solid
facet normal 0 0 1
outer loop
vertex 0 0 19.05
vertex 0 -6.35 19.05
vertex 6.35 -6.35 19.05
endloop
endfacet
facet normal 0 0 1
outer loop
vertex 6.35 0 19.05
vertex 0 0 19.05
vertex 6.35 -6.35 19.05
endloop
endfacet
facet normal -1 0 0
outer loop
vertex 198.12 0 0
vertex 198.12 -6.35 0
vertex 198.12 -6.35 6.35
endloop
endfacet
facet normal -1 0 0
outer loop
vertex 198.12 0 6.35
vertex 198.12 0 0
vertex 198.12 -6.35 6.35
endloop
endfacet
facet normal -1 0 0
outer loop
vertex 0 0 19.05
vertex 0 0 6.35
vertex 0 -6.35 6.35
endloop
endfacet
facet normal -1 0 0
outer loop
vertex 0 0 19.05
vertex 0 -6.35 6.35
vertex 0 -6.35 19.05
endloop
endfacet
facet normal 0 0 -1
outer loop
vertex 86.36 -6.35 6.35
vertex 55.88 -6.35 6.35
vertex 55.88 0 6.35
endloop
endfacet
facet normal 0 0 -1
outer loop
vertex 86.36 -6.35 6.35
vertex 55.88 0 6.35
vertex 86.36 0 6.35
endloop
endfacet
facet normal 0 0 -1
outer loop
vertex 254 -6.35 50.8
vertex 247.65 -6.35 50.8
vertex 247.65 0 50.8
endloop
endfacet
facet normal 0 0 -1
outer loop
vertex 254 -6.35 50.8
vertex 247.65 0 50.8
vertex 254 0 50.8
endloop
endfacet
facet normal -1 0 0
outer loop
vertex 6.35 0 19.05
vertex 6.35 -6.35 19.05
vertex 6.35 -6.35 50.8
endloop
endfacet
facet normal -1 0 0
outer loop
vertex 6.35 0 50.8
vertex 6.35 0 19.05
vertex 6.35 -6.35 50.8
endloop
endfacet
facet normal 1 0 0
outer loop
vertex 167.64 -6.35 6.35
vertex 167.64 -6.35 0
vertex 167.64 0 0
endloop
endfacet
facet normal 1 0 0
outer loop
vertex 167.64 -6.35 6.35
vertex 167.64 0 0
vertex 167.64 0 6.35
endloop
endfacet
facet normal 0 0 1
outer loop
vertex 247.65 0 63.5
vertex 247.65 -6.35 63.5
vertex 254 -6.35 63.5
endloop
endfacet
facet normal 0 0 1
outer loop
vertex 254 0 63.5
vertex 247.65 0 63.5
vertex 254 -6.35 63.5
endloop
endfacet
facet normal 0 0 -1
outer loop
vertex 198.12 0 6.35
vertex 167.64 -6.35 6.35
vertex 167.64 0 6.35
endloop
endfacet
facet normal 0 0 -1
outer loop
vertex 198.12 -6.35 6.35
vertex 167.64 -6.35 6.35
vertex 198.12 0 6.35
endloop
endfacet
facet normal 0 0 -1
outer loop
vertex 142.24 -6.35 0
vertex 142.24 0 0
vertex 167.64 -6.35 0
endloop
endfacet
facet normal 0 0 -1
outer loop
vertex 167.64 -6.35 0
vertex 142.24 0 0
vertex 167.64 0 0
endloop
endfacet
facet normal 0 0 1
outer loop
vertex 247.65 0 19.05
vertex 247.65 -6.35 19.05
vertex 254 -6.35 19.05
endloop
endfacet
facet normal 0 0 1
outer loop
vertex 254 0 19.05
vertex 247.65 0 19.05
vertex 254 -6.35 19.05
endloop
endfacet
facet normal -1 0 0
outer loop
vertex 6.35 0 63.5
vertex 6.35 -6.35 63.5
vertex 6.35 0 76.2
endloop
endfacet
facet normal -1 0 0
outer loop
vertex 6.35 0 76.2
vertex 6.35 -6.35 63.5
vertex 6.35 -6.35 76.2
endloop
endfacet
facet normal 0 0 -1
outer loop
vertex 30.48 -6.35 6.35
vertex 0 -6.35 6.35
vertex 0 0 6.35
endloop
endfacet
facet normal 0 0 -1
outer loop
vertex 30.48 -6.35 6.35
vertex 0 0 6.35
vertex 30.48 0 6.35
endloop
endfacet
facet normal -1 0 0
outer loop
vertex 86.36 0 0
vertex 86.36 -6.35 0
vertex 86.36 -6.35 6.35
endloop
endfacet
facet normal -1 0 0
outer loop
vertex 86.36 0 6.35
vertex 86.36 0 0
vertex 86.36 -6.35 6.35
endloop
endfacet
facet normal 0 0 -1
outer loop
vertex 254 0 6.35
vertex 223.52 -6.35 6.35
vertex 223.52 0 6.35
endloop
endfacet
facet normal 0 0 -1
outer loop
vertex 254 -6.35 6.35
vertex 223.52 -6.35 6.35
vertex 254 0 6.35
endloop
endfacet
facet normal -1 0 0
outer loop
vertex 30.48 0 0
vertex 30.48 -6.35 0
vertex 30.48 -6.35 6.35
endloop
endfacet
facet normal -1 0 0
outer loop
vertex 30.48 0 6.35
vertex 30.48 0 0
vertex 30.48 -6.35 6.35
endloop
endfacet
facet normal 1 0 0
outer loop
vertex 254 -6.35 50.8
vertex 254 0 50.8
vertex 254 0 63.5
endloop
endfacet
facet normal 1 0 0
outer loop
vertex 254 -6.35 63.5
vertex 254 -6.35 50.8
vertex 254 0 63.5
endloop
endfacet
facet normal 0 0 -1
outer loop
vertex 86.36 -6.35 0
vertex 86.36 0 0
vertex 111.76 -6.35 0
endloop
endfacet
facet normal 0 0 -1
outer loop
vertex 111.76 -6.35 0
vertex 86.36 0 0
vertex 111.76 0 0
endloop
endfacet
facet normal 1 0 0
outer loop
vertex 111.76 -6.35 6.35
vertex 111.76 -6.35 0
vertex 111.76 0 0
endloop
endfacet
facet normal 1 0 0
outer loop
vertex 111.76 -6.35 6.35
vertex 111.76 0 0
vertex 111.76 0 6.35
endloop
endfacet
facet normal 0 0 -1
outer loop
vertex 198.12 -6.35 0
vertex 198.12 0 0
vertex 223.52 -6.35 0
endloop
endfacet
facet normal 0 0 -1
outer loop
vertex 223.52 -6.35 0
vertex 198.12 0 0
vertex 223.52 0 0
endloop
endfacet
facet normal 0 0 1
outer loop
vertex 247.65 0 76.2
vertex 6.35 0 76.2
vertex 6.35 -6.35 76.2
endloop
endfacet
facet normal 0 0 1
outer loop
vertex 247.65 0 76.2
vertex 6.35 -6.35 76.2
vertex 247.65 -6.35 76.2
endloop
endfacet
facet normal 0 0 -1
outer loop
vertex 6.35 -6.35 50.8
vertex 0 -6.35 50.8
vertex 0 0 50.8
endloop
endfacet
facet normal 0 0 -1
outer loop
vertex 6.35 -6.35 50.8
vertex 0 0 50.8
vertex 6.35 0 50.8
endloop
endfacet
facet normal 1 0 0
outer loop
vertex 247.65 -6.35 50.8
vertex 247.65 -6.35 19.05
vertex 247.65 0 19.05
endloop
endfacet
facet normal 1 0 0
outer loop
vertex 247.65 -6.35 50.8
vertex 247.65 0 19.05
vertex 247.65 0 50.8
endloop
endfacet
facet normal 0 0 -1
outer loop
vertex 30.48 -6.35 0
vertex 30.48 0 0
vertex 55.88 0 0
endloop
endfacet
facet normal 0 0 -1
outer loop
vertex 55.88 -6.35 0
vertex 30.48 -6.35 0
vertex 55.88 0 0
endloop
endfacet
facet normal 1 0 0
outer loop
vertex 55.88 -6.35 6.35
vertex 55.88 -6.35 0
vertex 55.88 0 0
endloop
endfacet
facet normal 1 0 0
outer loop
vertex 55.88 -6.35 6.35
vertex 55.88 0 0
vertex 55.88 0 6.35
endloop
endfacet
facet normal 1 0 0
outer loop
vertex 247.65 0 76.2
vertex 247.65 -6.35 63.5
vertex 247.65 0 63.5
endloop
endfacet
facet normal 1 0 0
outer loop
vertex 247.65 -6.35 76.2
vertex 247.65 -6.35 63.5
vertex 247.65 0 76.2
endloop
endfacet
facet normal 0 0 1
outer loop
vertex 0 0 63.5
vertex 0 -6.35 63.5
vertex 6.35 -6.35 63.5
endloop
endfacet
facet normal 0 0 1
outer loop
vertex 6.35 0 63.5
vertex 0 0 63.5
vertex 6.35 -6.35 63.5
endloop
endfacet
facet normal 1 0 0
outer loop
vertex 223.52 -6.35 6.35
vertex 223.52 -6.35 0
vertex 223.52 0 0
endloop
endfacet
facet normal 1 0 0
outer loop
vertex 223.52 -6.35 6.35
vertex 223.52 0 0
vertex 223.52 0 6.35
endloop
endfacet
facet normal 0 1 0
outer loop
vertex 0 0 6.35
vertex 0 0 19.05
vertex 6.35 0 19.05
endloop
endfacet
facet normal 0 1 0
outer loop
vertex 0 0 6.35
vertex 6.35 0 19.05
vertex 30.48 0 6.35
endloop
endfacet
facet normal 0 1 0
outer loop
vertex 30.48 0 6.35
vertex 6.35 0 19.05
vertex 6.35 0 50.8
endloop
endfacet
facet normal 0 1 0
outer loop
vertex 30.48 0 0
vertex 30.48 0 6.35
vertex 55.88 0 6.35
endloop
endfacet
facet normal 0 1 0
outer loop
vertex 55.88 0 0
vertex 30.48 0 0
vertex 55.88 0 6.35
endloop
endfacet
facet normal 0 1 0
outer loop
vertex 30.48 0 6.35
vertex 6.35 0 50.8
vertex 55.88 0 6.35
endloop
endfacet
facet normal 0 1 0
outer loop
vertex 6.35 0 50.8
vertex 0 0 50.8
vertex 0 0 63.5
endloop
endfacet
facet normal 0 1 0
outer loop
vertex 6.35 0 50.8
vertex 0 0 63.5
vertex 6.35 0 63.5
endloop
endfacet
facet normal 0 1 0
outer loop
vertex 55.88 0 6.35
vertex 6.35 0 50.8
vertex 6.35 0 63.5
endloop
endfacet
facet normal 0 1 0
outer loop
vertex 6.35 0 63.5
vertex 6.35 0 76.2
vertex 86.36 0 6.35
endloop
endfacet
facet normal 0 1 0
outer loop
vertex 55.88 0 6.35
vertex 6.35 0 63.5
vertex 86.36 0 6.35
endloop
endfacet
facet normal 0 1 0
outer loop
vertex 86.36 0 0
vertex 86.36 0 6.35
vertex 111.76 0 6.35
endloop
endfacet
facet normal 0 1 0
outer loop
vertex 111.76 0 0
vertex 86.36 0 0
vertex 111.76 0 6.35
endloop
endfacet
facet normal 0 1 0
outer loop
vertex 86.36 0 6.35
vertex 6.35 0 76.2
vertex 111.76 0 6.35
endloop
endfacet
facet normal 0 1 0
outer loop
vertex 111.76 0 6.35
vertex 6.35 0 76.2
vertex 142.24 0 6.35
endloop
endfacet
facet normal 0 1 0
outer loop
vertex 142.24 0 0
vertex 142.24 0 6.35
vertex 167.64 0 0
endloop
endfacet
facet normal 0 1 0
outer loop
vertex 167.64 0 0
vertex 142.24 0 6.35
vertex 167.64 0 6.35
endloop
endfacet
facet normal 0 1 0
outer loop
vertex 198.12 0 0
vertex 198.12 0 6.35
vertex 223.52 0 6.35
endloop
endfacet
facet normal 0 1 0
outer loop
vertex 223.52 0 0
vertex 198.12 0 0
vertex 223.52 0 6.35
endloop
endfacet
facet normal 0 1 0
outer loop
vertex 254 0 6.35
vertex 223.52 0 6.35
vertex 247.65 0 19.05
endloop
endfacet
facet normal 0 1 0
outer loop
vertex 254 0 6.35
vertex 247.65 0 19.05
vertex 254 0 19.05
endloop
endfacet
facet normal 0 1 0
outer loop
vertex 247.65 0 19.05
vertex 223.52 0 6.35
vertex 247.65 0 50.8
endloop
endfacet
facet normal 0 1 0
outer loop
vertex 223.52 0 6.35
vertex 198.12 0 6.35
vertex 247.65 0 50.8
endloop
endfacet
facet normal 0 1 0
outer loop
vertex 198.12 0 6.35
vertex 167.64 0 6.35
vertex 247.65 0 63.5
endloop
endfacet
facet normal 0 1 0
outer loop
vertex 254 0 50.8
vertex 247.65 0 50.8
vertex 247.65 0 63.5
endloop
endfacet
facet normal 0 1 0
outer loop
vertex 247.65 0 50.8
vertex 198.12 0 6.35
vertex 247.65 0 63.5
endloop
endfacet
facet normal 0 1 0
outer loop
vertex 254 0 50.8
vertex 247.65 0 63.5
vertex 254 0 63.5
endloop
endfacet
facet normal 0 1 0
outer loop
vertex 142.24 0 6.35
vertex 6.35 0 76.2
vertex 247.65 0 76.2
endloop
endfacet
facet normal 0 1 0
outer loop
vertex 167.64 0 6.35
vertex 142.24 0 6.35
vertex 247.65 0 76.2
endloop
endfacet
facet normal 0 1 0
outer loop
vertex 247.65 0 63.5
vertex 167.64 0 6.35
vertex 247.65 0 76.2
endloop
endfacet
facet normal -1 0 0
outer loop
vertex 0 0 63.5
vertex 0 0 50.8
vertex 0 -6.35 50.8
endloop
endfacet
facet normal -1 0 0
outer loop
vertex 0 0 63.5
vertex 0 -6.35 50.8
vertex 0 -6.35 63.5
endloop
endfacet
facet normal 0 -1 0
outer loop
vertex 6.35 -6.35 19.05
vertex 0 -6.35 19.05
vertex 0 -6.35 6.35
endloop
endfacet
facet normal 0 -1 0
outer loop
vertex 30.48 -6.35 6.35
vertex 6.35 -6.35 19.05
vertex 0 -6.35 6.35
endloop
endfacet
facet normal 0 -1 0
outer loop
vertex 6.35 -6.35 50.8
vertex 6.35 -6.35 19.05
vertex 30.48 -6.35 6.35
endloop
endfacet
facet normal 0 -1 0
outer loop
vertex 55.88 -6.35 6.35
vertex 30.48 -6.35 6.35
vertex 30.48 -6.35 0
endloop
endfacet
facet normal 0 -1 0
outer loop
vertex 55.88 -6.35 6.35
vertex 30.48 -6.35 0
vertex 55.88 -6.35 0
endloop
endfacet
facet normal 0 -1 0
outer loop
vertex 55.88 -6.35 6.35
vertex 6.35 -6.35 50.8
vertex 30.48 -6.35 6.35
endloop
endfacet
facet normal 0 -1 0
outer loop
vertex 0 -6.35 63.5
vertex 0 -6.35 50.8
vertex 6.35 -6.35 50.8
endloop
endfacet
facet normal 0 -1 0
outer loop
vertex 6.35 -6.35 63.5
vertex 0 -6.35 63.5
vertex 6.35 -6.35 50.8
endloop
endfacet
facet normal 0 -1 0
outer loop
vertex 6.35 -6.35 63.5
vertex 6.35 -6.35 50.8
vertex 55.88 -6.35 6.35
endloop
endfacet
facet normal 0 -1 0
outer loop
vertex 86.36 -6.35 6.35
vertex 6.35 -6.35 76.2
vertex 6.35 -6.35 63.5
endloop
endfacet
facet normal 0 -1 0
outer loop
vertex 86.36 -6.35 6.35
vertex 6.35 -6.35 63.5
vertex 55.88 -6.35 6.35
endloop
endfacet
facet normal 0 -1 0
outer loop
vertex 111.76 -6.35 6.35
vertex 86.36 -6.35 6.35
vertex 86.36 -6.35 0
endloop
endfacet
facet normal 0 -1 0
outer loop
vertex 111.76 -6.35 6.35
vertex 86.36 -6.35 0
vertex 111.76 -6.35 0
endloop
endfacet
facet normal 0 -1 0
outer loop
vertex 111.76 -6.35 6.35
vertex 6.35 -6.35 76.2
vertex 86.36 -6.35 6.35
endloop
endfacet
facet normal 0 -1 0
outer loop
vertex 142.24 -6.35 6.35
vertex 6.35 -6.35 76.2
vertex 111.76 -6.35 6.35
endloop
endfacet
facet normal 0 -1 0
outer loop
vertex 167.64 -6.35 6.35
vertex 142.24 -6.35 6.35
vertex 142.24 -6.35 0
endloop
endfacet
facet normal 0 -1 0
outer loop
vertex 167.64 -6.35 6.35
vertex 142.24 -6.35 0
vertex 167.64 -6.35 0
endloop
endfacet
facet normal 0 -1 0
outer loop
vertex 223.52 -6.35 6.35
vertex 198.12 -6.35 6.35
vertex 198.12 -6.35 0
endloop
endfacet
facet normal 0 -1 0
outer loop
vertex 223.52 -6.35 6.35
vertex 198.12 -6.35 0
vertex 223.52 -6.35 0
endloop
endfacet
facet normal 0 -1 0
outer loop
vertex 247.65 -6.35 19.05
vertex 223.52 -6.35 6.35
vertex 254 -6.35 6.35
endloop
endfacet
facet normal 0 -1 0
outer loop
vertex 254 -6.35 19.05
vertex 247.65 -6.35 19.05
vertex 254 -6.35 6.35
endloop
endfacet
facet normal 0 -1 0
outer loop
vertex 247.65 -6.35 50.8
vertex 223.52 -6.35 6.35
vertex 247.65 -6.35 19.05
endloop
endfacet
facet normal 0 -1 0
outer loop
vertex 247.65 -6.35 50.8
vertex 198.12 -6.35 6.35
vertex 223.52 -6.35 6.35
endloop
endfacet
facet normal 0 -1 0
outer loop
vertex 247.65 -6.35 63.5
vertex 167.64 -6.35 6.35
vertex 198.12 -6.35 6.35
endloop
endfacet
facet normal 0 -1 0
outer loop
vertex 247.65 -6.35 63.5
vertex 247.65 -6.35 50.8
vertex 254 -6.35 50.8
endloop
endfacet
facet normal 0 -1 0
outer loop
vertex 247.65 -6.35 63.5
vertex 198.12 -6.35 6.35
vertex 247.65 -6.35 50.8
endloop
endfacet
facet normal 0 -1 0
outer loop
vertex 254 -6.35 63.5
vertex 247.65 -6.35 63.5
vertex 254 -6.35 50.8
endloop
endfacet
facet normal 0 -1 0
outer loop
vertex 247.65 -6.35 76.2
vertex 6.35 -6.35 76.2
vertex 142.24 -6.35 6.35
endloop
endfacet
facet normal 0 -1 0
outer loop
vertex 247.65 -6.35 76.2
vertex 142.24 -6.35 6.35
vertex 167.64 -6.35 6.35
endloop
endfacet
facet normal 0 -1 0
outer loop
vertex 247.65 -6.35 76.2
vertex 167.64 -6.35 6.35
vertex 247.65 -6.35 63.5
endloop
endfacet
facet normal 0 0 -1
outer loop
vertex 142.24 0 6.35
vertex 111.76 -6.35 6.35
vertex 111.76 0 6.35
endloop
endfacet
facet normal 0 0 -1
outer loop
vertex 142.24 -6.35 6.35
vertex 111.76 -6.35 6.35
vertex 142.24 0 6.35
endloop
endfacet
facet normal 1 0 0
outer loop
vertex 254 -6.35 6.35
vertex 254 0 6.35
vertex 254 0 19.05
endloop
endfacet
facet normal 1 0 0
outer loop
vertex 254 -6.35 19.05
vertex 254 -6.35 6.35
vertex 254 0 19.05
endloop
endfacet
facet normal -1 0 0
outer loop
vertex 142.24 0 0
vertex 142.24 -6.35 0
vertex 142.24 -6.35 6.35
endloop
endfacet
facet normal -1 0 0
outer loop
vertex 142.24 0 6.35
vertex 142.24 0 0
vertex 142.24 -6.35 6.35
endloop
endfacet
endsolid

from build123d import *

# Parameters (mm, degrees)
F0_W     = 254
F0_H     = 76.2
F1_DEPTH = 6.35
F2_W     = 6.35
F2_H     = 6.35
F2_H_2   = 12.7
F2_H_3   = 31.75
F3_DEPTH = 6.35
F4_W     = 30.48
F4_H     = 6.35
F5_DEPTH = 6.351


with BuildPart() as f1:
    # F0 (on Front) → F1 (new body)
    with BuildSketch(Plane.XZ):
        with Locations((127, 38.1)):
            Rectangle(F0_W, F0_H)
    extrude(amount=F1_DEPTH)

    # F2 (on face) → F3 (cut, through all)
    with BuildSketch(Plane.XZ.offset(6.35)):
        with Locations((3.175, 3.175)):
            Rectangle(F2_W, F2_H)
        with Locations((3.175, 69.85)):
            Rectangle(F2_W, F2_H_2)
        with Locations((3.175, 34.925)):
            Rectangle(F2_W, F2_H_3)
        with Locations((250.825, 3.175)):
            Rectangle(F2_W, F2_H)
        with Locations((250.825, 34.925)):
            Rectangle(F2_W, F2_H_3)
        with Locations((250.825, 69.85)):
            Rectangle(F2_W, F2_H_2)
    extrude(amount=-F3_DEPTH, mode=Mode.SUBTRACT)

    # F4 (on face) → F5 (cut, through all)
    with BuildSketch(Plane.XZ.offset(6.35)):
        with Locations((15.24, 3.175)):
            Rectangle(F4_W, F4_H)
        with Locations((71.12, 3.175)):
            Rectangle(F4_W, F4_H)
        with Locations((127, 3.175)):
            Rectangle(F4_W, F4_H)
        with Locations((182.88, 3.175)):
            Rectangle(F4_W, F4_H)
        with Locations((238.76, 3.175)):
            Rectangle(F4_W, F4_H)
    extrude(amount=-F5_DEPTH, mode=Mode.SUBTRACT)


solid = f1.part
